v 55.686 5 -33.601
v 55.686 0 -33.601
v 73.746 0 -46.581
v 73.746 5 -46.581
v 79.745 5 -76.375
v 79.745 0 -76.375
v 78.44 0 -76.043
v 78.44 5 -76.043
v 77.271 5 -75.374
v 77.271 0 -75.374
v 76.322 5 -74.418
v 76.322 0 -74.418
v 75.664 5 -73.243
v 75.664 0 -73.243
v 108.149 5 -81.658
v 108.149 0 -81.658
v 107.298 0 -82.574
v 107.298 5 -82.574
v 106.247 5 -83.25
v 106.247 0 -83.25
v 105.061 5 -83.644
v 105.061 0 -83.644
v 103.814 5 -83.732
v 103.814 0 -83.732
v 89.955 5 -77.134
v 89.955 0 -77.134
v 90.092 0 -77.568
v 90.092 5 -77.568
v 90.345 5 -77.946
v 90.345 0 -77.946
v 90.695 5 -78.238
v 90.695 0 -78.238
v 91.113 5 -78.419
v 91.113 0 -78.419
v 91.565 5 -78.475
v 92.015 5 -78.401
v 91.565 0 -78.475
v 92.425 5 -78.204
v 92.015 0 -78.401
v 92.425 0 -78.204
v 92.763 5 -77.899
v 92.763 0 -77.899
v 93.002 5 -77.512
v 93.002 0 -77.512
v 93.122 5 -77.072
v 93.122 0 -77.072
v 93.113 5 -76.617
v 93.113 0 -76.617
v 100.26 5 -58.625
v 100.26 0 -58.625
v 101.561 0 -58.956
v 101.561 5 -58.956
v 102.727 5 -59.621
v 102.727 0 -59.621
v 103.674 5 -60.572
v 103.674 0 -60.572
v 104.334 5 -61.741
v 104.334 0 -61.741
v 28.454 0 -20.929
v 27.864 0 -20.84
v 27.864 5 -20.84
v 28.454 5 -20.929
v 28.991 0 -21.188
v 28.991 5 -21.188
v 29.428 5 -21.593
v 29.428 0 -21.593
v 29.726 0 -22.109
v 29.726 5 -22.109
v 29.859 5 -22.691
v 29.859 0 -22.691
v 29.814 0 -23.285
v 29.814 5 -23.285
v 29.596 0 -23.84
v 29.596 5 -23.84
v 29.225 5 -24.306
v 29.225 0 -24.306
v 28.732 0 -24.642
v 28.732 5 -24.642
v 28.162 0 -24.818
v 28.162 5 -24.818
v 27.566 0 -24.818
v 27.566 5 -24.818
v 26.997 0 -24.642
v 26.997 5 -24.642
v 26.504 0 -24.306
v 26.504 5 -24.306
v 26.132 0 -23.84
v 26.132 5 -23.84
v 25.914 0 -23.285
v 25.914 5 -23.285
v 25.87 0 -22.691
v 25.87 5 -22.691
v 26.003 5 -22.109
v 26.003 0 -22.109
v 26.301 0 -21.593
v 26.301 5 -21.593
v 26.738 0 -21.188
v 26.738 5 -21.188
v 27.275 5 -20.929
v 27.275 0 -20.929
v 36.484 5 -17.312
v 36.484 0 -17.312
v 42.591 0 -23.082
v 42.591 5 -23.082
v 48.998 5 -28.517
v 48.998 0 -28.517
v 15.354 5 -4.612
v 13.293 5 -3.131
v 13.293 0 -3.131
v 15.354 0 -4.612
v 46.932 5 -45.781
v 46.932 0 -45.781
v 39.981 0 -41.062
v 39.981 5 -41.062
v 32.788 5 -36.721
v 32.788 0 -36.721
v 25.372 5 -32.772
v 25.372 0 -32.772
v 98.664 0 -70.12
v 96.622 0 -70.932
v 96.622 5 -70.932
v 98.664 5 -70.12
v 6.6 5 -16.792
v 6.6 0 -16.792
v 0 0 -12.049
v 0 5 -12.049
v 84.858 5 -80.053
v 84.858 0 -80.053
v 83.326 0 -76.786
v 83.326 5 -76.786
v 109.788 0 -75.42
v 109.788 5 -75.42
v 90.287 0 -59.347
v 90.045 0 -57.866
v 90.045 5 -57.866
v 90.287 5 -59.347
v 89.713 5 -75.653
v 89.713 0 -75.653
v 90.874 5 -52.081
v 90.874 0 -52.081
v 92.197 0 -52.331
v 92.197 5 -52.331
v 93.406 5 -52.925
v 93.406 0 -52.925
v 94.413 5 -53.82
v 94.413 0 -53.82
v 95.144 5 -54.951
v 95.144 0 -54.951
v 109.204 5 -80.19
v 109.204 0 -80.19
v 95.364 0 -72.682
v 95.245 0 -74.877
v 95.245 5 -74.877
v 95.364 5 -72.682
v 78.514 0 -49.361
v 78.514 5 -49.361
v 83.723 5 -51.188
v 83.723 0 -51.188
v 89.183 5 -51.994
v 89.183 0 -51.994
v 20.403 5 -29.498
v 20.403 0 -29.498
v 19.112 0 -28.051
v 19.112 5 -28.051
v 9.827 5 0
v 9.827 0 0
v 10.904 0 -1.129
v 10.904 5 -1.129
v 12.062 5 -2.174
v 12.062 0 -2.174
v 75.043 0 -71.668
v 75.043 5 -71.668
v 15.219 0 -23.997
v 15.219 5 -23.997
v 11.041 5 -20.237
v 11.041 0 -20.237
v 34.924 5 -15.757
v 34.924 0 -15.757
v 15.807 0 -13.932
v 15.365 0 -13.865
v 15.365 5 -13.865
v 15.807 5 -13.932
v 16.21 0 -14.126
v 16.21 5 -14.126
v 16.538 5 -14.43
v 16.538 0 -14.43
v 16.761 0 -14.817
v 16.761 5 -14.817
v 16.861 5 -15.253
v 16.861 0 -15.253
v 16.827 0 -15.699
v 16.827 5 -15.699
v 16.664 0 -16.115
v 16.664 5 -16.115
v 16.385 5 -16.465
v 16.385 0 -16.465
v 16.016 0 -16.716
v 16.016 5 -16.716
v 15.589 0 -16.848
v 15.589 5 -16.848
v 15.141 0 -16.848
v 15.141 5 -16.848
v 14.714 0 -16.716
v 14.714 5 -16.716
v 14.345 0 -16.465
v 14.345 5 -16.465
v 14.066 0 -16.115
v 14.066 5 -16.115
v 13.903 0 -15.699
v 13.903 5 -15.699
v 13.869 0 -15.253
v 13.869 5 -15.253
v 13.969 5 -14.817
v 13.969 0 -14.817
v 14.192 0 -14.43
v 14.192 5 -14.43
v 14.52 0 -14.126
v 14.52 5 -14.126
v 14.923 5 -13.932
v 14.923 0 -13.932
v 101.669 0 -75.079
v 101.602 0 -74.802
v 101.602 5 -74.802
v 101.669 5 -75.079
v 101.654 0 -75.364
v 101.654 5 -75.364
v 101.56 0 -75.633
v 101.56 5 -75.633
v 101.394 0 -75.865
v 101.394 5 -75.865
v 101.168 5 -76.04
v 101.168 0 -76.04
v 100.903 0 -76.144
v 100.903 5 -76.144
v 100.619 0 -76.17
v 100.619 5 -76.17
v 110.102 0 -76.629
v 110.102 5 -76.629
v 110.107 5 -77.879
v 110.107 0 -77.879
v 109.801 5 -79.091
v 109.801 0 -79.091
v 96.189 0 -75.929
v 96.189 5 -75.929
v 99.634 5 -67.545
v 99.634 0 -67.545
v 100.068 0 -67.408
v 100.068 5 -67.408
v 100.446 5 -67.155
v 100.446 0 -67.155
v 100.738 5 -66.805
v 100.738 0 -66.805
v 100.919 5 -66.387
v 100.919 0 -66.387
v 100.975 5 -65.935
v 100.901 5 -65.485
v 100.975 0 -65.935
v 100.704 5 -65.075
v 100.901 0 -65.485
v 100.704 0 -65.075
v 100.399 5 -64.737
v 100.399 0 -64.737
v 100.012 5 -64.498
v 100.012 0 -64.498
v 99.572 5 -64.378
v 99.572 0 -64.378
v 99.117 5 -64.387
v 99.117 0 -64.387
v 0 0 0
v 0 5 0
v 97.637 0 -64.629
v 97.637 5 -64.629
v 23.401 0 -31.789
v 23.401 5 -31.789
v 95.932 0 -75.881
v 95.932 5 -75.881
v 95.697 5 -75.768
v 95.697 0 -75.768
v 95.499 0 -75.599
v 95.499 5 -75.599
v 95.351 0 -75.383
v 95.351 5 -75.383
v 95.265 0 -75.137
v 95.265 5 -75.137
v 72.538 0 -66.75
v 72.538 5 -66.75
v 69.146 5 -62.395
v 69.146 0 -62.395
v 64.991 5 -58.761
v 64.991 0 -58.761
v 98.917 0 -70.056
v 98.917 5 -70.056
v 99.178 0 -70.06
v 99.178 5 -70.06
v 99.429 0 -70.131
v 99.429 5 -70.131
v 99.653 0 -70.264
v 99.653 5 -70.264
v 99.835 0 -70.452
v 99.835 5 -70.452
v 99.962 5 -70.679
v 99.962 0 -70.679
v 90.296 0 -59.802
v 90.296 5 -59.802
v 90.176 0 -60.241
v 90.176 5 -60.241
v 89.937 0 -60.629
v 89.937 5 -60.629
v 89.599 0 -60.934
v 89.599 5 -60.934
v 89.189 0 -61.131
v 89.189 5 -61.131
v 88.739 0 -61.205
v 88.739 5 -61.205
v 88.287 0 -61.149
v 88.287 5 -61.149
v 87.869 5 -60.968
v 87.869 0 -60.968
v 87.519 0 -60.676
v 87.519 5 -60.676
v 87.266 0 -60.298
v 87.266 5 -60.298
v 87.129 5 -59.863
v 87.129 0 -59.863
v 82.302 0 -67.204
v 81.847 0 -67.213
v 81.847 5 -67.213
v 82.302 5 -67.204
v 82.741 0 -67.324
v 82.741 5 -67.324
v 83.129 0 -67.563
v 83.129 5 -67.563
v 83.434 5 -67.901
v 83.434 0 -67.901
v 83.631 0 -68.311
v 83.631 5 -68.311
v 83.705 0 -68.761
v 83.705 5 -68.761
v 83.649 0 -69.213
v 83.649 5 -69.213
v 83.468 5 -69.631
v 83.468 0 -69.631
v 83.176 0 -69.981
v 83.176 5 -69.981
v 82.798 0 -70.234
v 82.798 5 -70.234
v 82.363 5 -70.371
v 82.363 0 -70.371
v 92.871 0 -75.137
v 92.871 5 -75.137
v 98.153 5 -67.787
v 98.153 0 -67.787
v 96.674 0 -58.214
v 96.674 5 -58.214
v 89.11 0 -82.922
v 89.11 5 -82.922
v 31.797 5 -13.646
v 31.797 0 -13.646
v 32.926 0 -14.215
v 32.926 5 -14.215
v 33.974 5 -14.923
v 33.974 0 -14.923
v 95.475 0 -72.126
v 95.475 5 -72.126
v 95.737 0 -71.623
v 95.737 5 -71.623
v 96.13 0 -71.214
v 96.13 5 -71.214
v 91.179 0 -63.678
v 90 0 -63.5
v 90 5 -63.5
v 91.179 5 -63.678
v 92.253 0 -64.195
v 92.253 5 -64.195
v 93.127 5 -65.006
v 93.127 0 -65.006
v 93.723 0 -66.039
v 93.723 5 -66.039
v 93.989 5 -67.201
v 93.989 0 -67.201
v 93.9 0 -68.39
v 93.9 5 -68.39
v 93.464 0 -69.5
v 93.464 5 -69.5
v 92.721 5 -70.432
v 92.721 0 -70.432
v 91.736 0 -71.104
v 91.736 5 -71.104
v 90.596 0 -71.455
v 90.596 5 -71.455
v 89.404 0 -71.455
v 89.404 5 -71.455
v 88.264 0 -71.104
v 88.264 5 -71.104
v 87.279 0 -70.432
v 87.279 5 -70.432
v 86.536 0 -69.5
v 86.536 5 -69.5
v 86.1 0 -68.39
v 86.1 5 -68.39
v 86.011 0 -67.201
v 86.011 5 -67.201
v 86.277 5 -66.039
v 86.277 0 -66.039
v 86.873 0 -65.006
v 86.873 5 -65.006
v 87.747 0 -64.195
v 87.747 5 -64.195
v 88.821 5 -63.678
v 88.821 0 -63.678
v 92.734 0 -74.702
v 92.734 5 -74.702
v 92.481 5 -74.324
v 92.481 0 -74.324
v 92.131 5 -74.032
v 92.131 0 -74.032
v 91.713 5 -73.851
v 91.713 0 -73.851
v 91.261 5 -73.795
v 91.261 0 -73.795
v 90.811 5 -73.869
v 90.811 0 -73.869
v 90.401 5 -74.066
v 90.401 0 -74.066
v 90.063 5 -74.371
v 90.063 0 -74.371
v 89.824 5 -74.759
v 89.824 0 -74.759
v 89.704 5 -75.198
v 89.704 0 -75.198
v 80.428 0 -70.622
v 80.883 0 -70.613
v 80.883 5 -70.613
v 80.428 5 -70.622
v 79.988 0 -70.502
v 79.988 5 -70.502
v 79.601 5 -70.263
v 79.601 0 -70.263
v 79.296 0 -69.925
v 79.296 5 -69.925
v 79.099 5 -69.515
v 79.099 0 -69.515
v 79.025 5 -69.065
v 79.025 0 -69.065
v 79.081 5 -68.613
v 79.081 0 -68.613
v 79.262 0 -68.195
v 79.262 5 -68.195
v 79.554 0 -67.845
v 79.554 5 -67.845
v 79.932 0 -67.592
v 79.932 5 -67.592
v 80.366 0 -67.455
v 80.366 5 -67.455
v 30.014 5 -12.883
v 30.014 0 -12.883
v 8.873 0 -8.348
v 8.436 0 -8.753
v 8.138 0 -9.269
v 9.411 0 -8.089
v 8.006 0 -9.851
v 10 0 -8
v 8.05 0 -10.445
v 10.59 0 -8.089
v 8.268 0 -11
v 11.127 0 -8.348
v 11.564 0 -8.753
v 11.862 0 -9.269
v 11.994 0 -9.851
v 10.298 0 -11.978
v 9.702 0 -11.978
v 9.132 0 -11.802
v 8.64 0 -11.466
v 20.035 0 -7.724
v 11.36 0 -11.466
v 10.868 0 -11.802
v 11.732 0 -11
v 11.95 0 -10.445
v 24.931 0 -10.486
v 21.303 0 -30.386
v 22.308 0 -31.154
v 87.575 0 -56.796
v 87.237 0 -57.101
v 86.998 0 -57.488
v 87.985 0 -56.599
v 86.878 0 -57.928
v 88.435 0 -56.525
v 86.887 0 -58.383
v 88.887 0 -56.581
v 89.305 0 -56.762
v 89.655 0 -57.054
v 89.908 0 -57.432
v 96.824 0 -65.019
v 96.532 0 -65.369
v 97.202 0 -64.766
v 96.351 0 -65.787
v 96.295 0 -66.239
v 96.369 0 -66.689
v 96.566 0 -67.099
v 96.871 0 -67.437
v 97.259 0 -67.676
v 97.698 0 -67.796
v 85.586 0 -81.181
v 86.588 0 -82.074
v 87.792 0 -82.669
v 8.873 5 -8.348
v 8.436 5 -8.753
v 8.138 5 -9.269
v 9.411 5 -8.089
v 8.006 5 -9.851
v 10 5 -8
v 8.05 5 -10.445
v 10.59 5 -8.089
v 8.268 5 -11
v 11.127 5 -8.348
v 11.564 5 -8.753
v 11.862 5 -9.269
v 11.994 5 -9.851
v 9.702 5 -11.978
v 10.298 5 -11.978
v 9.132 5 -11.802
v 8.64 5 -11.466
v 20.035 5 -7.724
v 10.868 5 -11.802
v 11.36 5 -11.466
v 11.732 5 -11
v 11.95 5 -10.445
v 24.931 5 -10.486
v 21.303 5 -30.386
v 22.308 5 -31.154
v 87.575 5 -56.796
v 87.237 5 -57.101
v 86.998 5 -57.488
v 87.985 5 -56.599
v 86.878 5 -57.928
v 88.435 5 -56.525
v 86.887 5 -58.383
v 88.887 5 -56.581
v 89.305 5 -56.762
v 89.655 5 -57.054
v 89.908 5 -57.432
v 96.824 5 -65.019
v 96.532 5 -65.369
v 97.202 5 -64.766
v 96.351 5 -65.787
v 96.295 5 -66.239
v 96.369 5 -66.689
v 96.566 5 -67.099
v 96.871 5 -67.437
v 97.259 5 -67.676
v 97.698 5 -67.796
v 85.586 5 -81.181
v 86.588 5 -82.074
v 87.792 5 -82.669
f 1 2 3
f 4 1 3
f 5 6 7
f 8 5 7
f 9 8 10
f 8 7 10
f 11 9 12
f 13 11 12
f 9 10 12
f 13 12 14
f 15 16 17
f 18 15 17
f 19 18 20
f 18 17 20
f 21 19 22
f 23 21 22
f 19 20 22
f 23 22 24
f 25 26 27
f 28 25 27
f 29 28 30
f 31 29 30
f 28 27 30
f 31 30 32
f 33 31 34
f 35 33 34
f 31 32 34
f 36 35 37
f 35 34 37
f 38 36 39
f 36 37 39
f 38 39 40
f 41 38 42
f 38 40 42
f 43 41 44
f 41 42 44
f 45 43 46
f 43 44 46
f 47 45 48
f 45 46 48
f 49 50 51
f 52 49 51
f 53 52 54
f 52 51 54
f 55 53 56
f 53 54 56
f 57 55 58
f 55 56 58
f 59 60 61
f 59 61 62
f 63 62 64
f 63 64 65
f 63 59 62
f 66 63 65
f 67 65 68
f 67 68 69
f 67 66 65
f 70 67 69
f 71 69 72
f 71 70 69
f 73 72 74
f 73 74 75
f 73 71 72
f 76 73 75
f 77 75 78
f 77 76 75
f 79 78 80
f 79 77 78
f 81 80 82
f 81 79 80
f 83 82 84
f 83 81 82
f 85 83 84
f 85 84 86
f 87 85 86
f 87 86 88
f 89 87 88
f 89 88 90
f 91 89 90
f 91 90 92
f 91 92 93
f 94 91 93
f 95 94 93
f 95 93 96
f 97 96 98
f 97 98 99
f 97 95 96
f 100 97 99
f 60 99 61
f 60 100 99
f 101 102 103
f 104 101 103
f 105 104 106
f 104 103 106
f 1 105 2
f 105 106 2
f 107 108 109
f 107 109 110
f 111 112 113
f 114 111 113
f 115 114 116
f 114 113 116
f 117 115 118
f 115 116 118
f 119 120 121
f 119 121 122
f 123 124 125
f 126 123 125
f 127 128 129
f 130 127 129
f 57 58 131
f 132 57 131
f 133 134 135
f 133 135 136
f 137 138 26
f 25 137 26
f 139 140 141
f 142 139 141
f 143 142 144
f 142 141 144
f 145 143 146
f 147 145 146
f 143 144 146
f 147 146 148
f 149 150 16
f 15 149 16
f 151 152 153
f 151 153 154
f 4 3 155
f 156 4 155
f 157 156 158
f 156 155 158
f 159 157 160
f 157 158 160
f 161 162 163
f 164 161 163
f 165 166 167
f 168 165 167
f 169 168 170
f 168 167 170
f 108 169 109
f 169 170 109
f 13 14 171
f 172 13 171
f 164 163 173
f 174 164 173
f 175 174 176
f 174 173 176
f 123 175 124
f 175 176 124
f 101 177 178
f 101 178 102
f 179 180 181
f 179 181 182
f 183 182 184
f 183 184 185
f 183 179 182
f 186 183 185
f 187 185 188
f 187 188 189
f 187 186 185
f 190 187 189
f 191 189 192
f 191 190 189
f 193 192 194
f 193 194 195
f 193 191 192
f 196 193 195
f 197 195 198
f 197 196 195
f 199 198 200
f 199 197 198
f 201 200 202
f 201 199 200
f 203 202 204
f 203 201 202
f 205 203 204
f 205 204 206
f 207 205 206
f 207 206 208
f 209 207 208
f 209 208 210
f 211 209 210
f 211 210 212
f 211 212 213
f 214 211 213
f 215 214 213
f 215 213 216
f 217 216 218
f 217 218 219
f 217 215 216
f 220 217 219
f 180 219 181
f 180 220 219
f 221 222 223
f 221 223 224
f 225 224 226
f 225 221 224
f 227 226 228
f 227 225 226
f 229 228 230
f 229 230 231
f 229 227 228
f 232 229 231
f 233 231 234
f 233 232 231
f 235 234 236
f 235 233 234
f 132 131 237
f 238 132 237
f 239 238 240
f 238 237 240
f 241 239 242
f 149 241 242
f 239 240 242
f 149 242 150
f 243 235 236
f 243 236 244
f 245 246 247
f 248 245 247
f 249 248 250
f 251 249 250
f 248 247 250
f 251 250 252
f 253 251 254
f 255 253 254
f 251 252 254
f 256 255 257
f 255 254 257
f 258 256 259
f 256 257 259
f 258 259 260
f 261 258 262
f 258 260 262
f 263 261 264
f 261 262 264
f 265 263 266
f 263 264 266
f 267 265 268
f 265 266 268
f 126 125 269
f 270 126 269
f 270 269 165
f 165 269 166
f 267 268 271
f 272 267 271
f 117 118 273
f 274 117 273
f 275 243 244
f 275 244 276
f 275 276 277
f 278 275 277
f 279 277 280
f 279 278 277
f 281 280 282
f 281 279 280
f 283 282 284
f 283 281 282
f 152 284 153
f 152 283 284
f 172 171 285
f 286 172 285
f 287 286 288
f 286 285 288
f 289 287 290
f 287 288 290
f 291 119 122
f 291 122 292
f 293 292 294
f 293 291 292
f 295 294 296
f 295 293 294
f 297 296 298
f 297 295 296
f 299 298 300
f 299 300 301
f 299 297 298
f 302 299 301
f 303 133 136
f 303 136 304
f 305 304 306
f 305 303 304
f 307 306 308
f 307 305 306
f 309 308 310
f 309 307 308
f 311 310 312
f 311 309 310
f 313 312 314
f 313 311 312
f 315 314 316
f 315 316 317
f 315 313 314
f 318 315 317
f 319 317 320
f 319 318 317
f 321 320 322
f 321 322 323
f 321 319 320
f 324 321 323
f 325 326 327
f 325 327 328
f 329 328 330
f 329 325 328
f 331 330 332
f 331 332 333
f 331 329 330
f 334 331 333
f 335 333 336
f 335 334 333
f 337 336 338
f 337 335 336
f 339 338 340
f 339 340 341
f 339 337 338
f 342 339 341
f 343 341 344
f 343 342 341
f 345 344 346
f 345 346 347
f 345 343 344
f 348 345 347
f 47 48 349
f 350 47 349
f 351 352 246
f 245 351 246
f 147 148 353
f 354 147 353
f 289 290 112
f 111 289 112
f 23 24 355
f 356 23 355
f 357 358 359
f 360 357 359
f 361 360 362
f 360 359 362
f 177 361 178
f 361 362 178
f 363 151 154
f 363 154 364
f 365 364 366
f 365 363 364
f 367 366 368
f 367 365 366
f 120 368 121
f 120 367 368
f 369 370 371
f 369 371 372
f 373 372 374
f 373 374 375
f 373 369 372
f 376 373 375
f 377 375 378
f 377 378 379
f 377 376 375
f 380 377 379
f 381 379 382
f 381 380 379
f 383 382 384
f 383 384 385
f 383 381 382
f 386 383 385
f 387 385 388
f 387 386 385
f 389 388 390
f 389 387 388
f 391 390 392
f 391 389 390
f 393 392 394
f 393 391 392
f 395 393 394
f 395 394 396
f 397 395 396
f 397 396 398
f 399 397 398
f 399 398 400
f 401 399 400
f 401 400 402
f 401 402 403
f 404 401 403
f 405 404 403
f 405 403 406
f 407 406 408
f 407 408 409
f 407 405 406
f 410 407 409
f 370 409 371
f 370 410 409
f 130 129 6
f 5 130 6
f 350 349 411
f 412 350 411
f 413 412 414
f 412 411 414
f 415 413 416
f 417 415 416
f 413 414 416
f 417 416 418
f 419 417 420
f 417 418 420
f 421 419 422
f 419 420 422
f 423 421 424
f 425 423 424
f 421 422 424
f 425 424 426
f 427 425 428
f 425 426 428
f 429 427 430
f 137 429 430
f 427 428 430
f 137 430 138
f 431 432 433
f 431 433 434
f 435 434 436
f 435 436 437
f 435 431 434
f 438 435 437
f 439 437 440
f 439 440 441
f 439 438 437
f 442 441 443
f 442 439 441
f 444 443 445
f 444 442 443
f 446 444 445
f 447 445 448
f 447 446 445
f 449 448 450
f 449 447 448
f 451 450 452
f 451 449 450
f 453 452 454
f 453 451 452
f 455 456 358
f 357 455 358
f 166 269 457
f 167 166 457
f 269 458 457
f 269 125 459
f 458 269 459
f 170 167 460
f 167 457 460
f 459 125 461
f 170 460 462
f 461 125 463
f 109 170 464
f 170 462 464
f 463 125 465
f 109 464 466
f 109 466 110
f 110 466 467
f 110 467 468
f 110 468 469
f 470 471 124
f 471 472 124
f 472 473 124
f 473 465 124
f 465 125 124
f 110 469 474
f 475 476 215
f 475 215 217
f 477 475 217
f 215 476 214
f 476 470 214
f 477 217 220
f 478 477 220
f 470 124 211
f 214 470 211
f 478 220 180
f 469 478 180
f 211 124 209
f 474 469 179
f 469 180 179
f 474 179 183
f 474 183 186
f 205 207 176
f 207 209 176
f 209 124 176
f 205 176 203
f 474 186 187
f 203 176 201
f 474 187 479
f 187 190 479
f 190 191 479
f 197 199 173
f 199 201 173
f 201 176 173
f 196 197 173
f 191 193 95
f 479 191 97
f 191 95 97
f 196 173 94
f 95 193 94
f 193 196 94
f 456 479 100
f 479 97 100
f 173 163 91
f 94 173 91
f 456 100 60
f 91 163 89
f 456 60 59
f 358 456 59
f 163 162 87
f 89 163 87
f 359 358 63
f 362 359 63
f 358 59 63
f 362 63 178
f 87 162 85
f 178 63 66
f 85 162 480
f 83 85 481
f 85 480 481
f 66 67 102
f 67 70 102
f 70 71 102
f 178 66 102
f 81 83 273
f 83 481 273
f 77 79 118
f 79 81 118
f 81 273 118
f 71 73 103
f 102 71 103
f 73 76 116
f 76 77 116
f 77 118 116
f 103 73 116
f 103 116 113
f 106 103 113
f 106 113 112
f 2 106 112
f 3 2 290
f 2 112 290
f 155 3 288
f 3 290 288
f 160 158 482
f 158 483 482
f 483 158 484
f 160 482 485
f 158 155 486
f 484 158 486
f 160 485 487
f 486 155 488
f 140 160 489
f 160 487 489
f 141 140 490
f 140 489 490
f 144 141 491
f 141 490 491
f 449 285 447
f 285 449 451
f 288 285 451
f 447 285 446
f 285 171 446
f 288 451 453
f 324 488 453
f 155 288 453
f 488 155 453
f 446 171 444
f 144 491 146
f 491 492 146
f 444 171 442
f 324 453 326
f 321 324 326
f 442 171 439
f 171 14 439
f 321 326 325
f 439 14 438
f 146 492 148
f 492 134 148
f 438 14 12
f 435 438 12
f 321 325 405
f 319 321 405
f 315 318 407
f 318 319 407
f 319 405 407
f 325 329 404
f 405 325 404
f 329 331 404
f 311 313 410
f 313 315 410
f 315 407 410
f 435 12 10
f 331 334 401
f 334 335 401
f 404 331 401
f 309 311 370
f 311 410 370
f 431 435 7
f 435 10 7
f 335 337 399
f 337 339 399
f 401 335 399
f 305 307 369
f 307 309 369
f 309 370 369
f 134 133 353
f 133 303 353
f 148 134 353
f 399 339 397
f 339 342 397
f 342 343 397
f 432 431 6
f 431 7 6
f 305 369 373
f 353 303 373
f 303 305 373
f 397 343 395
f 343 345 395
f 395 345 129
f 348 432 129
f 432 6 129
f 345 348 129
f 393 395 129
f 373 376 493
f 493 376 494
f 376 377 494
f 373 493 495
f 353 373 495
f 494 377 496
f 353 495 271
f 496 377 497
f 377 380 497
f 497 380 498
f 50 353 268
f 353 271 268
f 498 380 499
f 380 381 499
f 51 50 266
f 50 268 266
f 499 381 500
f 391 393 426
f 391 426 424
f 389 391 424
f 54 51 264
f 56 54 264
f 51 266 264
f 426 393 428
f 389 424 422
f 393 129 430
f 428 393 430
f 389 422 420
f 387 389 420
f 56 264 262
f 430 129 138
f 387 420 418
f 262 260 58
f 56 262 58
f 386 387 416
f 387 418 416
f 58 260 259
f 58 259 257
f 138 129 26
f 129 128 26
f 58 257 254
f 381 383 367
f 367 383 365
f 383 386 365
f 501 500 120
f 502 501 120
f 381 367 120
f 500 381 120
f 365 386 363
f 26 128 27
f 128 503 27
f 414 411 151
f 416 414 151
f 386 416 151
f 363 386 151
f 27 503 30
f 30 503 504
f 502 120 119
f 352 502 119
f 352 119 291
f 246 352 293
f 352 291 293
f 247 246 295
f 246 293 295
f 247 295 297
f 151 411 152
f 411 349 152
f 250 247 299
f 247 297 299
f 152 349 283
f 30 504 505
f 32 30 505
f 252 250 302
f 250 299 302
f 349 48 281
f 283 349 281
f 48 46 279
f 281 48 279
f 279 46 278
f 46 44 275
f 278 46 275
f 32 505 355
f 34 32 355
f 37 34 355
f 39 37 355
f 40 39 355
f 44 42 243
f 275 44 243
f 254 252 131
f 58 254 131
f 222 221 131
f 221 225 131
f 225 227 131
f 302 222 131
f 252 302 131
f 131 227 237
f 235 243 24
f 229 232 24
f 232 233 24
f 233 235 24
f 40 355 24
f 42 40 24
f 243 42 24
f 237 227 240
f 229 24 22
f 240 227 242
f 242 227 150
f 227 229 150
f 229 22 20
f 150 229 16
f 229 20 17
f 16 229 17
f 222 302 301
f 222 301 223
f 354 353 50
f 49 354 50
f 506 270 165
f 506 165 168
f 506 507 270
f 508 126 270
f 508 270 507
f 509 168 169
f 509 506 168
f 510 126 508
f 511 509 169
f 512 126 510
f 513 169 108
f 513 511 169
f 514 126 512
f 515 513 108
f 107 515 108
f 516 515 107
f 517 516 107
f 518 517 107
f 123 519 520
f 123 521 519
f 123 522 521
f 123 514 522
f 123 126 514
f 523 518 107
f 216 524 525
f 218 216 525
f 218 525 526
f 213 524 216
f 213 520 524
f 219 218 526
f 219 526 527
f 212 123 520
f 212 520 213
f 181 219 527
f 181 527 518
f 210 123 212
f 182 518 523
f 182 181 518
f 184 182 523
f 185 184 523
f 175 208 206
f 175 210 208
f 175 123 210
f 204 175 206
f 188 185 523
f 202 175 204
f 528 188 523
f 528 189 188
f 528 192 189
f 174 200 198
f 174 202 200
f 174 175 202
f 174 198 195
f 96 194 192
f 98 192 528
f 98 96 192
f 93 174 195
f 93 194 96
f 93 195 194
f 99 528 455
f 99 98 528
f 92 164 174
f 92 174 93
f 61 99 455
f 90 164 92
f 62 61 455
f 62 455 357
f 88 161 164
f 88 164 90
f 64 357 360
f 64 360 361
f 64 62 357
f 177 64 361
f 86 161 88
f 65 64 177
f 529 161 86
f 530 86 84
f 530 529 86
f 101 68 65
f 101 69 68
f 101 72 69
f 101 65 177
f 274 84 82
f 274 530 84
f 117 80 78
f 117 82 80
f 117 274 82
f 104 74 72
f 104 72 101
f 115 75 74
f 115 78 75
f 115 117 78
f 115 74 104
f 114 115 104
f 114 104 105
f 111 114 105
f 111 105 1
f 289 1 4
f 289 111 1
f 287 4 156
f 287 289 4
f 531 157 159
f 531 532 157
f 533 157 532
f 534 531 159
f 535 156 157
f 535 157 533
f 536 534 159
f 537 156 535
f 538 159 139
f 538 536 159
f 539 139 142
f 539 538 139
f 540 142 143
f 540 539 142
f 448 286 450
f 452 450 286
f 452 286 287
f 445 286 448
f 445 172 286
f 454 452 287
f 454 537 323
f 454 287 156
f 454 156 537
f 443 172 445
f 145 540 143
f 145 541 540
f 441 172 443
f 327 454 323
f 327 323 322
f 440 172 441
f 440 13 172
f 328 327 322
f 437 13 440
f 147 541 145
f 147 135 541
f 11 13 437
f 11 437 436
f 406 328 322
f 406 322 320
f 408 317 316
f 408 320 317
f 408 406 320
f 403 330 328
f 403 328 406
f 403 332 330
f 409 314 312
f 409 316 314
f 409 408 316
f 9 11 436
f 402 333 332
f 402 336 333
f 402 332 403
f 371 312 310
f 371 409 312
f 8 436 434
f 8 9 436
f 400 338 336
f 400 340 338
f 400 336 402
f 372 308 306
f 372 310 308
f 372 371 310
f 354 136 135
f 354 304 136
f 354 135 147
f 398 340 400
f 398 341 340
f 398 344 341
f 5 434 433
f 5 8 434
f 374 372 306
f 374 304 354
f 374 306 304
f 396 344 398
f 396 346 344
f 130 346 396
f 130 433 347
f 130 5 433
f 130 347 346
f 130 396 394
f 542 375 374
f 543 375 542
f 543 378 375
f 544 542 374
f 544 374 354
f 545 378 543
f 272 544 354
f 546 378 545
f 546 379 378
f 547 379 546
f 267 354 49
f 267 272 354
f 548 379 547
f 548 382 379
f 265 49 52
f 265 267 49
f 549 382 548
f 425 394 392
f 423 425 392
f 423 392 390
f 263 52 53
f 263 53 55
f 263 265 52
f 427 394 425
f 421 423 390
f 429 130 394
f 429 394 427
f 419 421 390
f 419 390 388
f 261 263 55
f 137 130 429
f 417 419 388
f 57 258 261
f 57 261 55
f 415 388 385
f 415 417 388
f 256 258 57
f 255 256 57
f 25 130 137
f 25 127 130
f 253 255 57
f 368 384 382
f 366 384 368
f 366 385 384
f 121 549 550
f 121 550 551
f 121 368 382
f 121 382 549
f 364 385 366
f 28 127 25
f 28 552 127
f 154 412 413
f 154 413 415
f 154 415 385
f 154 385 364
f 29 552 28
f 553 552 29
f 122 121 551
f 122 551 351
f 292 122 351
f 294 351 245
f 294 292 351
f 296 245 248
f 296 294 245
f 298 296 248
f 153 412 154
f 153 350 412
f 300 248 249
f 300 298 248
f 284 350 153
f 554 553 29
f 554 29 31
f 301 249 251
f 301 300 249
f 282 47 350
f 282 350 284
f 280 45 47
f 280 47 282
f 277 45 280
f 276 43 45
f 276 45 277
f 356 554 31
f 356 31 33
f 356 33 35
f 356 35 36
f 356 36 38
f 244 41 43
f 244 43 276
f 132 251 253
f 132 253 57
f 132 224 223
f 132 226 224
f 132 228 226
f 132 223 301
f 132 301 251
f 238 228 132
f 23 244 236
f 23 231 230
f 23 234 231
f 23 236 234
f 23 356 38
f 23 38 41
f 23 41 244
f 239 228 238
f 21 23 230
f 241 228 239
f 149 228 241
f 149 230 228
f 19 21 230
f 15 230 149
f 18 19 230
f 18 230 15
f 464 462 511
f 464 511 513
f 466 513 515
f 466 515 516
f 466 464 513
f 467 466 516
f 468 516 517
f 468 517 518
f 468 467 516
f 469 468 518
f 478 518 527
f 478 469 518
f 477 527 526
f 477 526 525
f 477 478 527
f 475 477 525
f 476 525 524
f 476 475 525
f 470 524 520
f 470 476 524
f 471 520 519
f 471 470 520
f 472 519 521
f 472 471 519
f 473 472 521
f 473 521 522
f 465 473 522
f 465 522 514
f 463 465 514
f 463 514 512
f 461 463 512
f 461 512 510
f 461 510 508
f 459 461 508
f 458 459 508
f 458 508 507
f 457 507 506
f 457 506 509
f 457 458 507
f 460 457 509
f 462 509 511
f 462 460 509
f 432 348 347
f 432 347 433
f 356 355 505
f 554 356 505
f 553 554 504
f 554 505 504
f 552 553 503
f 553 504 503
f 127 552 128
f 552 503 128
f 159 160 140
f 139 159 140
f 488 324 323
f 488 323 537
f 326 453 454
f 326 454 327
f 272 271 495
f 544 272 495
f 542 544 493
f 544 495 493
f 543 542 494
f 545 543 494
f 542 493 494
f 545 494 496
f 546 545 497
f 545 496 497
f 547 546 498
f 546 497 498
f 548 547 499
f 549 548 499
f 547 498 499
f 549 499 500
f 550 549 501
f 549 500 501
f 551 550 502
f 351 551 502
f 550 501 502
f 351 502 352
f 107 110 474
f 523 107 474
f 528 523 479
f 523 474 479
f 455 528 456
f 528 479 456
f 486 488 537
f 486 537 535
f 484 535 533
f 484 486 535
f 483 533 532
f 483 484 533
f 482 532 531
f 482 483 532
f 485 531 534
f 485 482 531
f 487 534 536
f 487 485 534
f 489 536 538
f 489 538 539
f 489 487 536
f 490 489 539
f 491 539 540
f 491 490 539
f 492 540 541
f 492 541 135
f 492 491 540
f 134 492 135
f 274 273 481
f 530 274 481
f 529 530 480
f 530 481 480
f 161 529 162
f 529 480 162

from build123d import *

# Parameters (mm, degrees)
SKETCH2_R           = 2
SKETCH2_R_2         = 1.5
SKETCH2_R_3         = 4
BOSS_EXTRUDE1_DEPTH = 5


with BuildPart() as part:
    # Sketch2 → Boss-Extrude1 (new body)
    with BuildSketch(Plane(origin=(0, 0, 0), x_dir=(1, 0, 0), z_dir=(0, 1, 0))):
        with BuildLine():
            Line((96.674187099, 58.214174471), (100.259554689, 58.62537792))
            ThreePointArc((100.259554689, 58.62537792), (102.726861183, 59.620848143), (104.334258678, 61.740950876))
            Line((104.334258678, 61.740950876), (109.788302134, 75.41951978))
            ThreePointArc((109.788302134, 75.41951978), (110.106786378, 77.879348033), (109.203962948, 80.189563845))
            Line((109.203962948, 80.189563845), (108.148744134, 81.65769437))
            ThreePointArc((108.148744134, 81.65769437), (106.246786582, 83.249782532), (103.813742867, 83.731950064))
            Line((103.813742867, 83.731950064), (89.110198155, 82.922252473))
            ThreePointArc((89.110198155, 82.922252473), (86.58833532, 82.074449344), (84.858361795, 80.053124553))
            Line((84.858361795, 80.053124553), (83.325812901, 76.785825529))
            Line((83.325812901, 76.785825529), (79.745407576, 76.375191199))
            ThreePointArc((79.745407576, 76.375191199), (77.270804519, 75.374131292), (75.6639264, 73.24253003))
            Line((75.6639264, 73.24253003), (75.042843012, 71.6680711))
            ThreePointArc((75.042843012, 71.6680711), (70.946054903, 64.491253119), (64.991367673, 58.761323876))
            Line((64.991367673, 58.761323876), (46.931722679, 45.780954047))
            ThreePointArc((46.931722679, 45.780954047), (36.413241445, 38.843477801), (25.372306119, 32.77184118))
            Line((25.372306119, 32.77184118), (23.401205332, 31.788764494))
            ThreePointArc((23.401205332, 31.788764494), (21.793071121, 30.786042702), (20.402989885, 29.497935256))
            Line((20.402989885, 29.497935256), (19.112268572, 28.051458372))
            ThreePointArc((19.112268572, 28.051458372), (13.16458677, 22.078961314), (6.599736248, 16.792338805))
            Line((6.599736248, 16.792338805), (0, 12.048778377))
            Line((0, 12.048778377), (0, 0))
            Line((0, 0), (9.827416163, 0))
            ThreePointArc((9.827416163, 0), (11.473121255, 1.662110783), (13.293458997, 3.130895317))
            Line((13.293458997, 3.130895317), (15.354276971, 4.612108235))
            ThreePointArc((15.354276971, 4.612108235), (22.457631343, 9.149507995), (30.014371949, 12.883314543))
            Line((30.014371949, 12.883314543), (31.796806607, 13.645668513))
            ThreePointArc((31.796806607, 13.645668513), (33.460801696, 14.552678424), (34.923797775, 15.757331529))
            Line((34.923797775, 15.757331529), (36.483864554, 17.312281519))
            ThreePointArc((36.483864554, 17.312281519), (45.757987001, 25.842092678), (55.686263447, 33.60072351))
            Line((55.686263447, 33.60072351), (73.745908403, 46.581093312))
            ThreePointArc((73.745908403, 46.581093312), (81.074965721, 50.398855458), (89.183263316, 51.994442832))
            Line((89.183263316, 51.994442832), (90.873565855, 52.081292528))
            ThreePointArc((90.873565855, 52.081292528), (93.406161944, 52.924938353), (95.143759302, 54.951397494))
            Line((95.143759302, 54.951397494), (96.674187099, 58.214174471))
        make_face()
        with Locations(Location((10.000016395, 10.000011804, 0), (0, 0, 270))):
            Circle(SKETCH2_R, mode=Mode.SUBTRACT)
        with Locations(Location((27.864354565, 22.840004863, 0), (0, 0, 270))):
            Circle(SKETCH2_R, mode=Mode.SUBTRACT)
        with Locations(Location((15.365, 15.365, 0), (0, 0, 270))):
            Circle(SKETCH2_R_2, mode=Mode.SUBTRACT)
        with Locations(Location((90, 67.5, 0), (0, 0, 270))):
            Circle(SKETCH2_R_3, mode=Mode.SUBTRACT)
        with BuildLine():
            Line((100.618872181, 76.169797692), (96.189048483, 75.92936815))
            ThreePointArc((96.189048483, 75.92936815), (95.498854377, 75.598583427), (95.244713564, 74.876642374))
            Line((95.244713564, 74.876642374), (95.363815249, 72.682238728))
            ThreePointArc((95.363815249, 72.682238728), (95.736845201, 71.623357489), (96.621599456, 70.932278091))
            Line((96.621599456, 70.932278091), (98.663587114, 70.119948739))
            ThreePointArc((98.663587114, 70.119948739), (99.428878121, 70.130724305), (99.962401105, 70.679486242))
            Line((99.962401105, 70.679486242), (101.602243357, 74.8016291))
            ThreePointArc((101.602243357, 74.8016291), (101.485082981, 75.754903393), (100.618872181, 76.169797692))
        make_face(mode=Mode.SUBTRACT)
        with BuildLine():
            Line((99.116926829, 64.38685927), (97.636614954, 64.629092122))
            ThreePointArc((97.636614954, 64.629092122), (96.315997331, 66.466473164), (98.153378372, 67.787090788))
            Line((98.153378372, 67.787090788), (99.633690247, 67.544857936))
            ThreePointArc((99.633690247, 67.544857936), (100.95430787, 65.707476894), (99.116926829, 64.38685927))
        make_face(mode=Mode.SUBTRACT)
        with BuildLine():
            Line((93.11314073, 76.616926829), (92.870907878, 75.136614954))
            ThreePointArc((92.870907878, 75.136614954), (91.033526836, 73.815997331), (89.712909212, 75.653378372))
            Line((89.712909212, 75.653378372), (89.955142064, 77.133690247))
            ThreePointArc((89.955142064, 77.133690247), (91.792523106, 78.45430787), (93.11314073, 76.616926829))
        make_face(mode=Mode.SUBTRACT)
        with BuildLine():
            Line((80.366309753, 67.455142064), (81.846621628, 67.212909212))
            ThreePointArc((81.846621628, 67.212909212), (83.684002669, 68.533526836), (82.363385046, 70.370907878))
            Line((82.363385046, 70.370907878), (80.883073171, 70.61314073))
            ThreePointArc((80.883073171, 70.61314073), (79.04569213, 69.292523106), (80.366309753, 67.455142064))
        make_face(mode=Mode.SUBTRACT)
        with BuildLine():
            Line((90.044857936, 57.866309753), (90.287090788, 59.346621628))
            ThreePointArc((90.287090788, 59.346621628), (88.966473164, 61.184002669), (87.129092122, 59.863385046))
            Line((87.129092122, 59.863385046), (86.88685927, 58.383073171))
            ThreePointArc((86.88685927, 58.383073171), (88.207476894, 56.54569213), (90.044857936, 57.866309753))
        make_face(mode=Mode.SUBTRACT)
    extrude(amount=BOSS_EXTRUDE1_DEPTH)


solid = part.part
